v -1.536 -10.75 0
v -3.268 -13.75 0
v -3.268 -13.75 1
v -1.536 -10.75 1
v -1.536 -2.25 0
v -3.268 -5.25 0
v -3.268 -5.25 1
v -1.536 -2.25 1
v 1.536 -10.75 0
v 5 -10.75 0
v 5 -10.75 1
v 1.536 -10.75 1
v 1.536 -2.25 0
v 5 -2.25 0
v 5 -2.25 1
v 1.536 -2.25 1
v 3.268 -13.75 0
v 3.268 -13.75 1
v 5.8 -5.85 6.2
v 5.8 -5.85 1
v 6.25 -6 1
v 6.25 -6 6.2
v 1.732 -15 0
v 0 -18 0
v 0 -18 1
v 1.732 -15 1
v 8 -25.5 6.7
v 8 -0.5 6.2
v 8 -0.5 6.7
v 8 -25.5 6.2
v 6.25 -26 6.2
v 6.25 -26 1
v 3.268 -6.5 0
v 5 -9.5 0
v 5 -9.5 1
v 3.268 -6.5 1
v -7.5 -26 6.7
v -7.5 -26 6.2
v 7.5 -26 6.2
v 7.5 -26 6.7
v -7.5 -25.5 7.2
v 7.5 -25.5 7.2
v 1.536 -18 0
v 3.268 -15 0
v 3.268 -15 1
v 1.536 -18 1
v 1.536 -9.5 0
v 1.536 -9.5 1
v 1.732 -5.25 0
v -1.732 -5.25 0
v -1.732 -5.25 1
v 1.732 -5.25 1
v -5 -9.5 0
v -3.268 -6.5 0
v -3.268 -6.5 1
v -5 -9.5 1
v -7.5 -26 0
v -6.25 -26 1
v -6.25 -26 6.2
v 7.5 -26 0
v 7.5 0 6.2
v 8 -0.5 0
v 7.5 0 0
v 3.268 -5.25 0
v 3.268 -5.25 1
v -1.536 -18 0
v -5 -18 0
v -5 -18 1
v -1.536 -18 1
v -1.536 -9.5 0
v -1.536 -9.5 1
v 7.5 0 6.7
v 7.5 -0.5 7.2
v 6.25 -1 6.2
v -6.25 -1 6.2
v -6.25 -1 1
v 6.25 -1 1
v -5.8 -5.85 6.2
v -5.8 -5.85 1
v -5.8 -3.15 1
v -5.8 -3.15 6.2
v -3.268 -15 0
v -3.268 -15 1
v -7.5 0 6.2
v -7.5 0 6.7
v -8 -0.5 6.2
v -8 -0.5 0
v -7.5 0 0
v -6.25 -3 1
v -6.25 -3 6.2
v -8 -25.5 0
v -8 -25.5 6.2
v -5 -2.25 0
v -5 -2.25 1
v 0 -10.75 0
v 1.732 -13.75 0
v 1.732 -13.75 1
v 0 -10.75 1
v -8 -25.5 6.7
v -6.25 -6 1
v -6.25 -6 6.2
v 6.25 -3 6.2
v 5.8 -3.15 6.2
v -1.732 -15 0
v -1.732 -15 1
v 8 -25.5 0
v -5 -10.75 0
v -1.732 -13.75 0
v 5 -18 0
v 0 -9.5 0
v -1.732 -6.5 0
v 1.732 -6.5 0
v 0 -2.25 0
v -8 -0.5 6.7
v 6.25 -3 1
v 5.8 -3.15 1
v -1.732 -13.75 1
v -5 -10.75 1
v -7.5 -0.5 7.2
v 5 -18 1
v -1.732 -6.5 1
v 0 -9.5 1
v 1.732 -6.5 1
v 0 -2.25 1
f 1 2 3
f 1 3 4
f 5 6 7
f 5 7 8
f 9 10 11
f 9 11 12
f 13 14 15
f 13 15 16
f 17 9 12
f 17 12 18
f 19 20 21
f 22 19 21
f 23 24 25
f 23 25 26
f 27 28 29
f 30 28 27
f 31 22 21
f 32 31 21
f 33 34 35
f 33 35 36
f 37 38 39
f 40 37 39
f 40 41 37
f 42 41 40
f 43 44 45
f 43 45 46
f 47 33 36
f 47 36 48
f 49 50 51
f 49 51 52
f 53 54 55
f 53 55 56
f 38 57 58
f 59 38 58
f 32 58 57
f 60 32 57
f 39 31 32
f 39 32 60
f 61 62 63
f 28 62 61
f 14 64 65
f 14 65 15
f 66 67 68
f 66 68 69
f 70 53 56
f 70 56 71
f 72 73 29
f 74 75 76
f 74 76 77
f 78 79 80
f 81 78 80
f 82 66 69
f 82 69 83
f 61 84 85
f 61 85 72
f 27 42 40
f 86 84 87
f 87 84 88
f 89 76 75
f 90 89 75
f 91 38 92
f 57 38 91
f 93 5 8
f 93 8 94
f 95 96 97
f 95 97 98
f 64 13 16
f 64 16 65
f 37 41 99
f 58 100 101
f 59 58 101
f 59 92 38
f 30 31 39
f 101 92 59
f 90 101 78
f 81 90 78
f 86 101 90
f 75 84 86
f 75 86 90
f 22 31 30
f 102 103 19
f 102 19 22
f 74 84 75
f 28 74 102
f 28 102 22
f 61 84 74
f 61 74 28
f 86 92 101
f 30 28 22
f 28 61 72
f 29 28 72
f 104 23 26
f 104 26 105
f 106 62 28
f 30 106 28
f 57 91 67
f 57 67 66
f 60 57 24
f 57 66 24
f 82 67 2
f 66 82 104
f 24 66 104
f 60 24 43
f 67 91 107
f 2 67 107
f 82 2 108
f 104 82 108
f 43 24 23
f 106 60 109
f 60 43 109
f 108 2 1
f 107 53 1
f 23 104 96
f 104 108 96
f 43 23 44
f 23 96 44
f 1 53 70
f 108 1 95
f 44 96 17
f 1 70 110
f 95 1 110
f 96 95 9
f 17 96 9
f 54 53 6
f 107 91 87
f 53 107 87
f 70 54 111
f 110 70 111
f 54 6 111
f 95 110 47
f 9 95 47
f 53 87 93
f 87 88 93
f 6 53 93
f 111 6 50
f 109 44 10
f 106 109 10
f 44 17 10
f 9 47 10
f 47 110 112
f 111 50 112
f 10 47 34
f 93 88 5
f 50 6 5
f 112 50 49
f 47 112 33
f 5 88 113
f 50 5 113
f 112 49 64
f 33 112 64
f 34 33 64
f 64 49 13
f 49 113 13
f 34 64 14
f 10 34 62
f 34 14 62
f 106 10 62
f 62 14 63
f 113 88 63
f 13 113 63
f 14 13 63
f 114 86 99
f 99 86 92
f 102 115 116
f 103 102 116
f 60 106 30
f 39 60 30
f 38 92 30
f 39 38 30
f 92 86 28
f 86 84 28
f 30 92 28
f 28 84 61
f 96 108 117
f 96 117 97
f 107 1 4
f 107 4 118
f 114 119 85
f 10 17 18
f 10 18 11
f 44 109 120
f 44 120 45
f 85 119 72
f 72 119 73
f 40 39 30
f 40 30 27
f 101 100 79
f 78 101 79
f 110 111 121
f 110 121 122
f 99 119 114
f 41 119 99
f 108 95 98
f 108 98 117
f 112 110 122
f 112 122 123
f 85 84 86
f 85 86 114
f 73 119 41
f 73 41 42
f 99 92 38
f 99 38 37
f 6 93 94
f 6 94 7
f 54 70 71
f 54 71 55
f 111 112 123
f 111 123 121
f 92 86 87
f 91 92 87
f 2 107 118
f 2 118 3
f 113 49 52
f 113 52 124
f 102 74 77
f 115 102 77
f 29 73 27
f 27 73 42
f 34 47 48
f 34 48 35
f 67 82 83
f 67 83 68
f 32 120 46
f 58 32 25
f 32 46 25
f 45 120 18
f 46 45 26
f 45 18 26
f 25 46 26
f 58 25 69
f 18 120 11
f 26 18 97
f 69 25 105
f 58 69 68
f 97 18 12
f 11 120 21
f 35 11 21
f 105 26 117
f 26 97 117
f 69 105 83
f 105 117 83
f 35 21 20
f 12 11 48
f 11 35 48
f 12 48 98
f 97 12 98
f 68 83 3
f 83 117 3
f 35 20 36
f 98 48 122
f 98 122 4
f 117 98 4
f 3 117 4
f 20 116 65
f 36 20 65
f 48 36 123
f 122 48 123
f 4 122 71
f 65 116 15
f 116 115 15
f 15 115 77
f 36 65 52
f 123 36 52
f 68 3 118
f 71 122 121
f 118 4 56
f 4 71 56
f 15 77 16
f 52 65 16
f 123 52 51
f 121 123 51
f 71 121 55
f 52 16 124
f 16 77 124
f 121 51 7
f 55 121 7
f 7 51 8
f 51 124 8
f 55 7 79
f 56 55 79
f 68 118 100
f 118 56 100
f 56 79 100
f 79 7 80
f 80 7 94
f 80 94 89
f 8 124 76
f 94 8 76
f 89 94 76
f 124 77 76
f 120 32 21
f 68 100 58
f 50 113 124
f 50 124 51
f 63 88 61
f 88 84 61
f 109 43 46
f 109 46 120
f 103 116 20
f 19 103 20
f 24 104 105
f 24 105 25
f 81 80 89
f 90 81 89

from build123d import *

# Parameters (mm, degrees)
F3_DEPTH  = 26
F1_W      = 12.5
F1_H      = 5.2
F4_DEPTH  = 1
F5_DEPTH  = 6.2
F7_DEPTH  = 1
F9_SIZE   = 0.5
F9_2_SIZE = 0.5
F10_DEPTH = 25


with BuildPart() as f3:
    # F1 (on Front) → F3 (new body)
    with BuildSketch(Plane.XZ):
        Polygon((-6.25, 1), (-6.25, 6.2), (-8, 6.2), (-8, 0), (8, 0), (8, 6.2), (6.25, 6.2), (6.25, 1), align=None)
    extrude(amount=F3_DEPTH)

    # F1 (on Front) → F4 (join)
    with BuildSketch(Plane.XZ):
        with Locations((0, 3.6)):
            Rectangle(F1_W, F1_H)
    extrude(amount=F4_DEPTH)

    # F2 (on Top) → F5 (join)
    with BuildSketch(Plane.XY):
        Polygon((-5.8, -3.15), (-6.25, -3), (-6.25, -6), (-5.8, -5.85), align=None)
        Polygon((5.8, -3.15), (5.8, -5.85), (6.25, -6), (6.25, -3), align=None)
    extrude(amount=F5_DEPTH)


with BuildPart() as f7:
    # F7 (new): a face of the model
    f7_faces = [f3.part.faces().sort_by_distance(p)[0] for p in [
        (0, -13, 0),
    ]]
    extrude(f7_faces, amount=-F7_DEPTH)


with BuildPart() as f7_1:
    # F8: moved
    add(f7.part.moved(Location((0, 0, 6.2))))

    # F9#2
    f9_2_edges = [f7_1.edges().sort_by_distance(p)[0] for p in [
        (8, -13, 7.2),
        (0, -26, 7.2),
        (-8, -13, 7.2),
        (0, 0, 7.2),
        (8, 0, 6.7),
        (8, -26, 6.7),
        (-8, -26, 6.7),
        (-8, 0, 6.7),
    ]]
    chamfer(f9_2_edges, length=F9_2_SIZE)


with BuildPart() as f3_1:
    add(f3.part)

    # F9
    f9_edges = [f3_1.edges().sort_by_distance(p)[0] for p in [
        (8, -26, 3.1),
        (-8, -26, 3.1),
        (-8, 0, 3.1),
        (8, 0, 3.1),
    ]]
    chamfer(f9_edges, length=F9_SIZE)

    # F6 (on offset) → F10 (cut)
    with BuildSketch(Plane.XY.offset(-1)):
        Polygon((-5, -2.25), (-3.2679491924, -5.25), (-1.5358983849, -2.25), align=None)
        Polygon((0, -2.25), (-1.7320508076, -5.25), (1.7320508076, -5.25), align=None)
        Polygon((3.2679491924, -5.25), (5, -2.25), (1.5358983849, -2.25), align=None)
        Polygon((-5, -9.5), (-1.5358983849, -9.5), (-3.2679491924, -6.5), align=None)
        Polygon((-1.7320508076, -6.5), (0, -9.5), (1.7320508076, -6.5), align=None)
        Polygon((3.2679491924, -6.5), (1.5358983849, -9.5), (5, -9.5), align=None)
        Polygon((5, -10.75), (1.5358983849, -10.75), (3.2679491924, -13.75), align=None)
        Polygon((0, -10.75), (-1.7320508076, -13.75), (1.7320508076, -13.75), align=None)
        Polygon((-5, -10.75), (-3.2679491924, -13.75), (-1.5358983849, -10.75), align=None)
        Polygon((-1.5358983849, -18), (-3.2679491924, -15), (-5, -18), align=None)
        Polygon((-1.7320508076, -15), (0, -18), (1.7320508076, -15), align=None)
        Polygon((3.2679491924, -15), (1.5358983849, -18), (5, -18), align=None)
    extrude(amount=F10_DEPTH, mode=Mode.SUBTRACT)


solid = Compound([f7_1.part, f3_1.part])
